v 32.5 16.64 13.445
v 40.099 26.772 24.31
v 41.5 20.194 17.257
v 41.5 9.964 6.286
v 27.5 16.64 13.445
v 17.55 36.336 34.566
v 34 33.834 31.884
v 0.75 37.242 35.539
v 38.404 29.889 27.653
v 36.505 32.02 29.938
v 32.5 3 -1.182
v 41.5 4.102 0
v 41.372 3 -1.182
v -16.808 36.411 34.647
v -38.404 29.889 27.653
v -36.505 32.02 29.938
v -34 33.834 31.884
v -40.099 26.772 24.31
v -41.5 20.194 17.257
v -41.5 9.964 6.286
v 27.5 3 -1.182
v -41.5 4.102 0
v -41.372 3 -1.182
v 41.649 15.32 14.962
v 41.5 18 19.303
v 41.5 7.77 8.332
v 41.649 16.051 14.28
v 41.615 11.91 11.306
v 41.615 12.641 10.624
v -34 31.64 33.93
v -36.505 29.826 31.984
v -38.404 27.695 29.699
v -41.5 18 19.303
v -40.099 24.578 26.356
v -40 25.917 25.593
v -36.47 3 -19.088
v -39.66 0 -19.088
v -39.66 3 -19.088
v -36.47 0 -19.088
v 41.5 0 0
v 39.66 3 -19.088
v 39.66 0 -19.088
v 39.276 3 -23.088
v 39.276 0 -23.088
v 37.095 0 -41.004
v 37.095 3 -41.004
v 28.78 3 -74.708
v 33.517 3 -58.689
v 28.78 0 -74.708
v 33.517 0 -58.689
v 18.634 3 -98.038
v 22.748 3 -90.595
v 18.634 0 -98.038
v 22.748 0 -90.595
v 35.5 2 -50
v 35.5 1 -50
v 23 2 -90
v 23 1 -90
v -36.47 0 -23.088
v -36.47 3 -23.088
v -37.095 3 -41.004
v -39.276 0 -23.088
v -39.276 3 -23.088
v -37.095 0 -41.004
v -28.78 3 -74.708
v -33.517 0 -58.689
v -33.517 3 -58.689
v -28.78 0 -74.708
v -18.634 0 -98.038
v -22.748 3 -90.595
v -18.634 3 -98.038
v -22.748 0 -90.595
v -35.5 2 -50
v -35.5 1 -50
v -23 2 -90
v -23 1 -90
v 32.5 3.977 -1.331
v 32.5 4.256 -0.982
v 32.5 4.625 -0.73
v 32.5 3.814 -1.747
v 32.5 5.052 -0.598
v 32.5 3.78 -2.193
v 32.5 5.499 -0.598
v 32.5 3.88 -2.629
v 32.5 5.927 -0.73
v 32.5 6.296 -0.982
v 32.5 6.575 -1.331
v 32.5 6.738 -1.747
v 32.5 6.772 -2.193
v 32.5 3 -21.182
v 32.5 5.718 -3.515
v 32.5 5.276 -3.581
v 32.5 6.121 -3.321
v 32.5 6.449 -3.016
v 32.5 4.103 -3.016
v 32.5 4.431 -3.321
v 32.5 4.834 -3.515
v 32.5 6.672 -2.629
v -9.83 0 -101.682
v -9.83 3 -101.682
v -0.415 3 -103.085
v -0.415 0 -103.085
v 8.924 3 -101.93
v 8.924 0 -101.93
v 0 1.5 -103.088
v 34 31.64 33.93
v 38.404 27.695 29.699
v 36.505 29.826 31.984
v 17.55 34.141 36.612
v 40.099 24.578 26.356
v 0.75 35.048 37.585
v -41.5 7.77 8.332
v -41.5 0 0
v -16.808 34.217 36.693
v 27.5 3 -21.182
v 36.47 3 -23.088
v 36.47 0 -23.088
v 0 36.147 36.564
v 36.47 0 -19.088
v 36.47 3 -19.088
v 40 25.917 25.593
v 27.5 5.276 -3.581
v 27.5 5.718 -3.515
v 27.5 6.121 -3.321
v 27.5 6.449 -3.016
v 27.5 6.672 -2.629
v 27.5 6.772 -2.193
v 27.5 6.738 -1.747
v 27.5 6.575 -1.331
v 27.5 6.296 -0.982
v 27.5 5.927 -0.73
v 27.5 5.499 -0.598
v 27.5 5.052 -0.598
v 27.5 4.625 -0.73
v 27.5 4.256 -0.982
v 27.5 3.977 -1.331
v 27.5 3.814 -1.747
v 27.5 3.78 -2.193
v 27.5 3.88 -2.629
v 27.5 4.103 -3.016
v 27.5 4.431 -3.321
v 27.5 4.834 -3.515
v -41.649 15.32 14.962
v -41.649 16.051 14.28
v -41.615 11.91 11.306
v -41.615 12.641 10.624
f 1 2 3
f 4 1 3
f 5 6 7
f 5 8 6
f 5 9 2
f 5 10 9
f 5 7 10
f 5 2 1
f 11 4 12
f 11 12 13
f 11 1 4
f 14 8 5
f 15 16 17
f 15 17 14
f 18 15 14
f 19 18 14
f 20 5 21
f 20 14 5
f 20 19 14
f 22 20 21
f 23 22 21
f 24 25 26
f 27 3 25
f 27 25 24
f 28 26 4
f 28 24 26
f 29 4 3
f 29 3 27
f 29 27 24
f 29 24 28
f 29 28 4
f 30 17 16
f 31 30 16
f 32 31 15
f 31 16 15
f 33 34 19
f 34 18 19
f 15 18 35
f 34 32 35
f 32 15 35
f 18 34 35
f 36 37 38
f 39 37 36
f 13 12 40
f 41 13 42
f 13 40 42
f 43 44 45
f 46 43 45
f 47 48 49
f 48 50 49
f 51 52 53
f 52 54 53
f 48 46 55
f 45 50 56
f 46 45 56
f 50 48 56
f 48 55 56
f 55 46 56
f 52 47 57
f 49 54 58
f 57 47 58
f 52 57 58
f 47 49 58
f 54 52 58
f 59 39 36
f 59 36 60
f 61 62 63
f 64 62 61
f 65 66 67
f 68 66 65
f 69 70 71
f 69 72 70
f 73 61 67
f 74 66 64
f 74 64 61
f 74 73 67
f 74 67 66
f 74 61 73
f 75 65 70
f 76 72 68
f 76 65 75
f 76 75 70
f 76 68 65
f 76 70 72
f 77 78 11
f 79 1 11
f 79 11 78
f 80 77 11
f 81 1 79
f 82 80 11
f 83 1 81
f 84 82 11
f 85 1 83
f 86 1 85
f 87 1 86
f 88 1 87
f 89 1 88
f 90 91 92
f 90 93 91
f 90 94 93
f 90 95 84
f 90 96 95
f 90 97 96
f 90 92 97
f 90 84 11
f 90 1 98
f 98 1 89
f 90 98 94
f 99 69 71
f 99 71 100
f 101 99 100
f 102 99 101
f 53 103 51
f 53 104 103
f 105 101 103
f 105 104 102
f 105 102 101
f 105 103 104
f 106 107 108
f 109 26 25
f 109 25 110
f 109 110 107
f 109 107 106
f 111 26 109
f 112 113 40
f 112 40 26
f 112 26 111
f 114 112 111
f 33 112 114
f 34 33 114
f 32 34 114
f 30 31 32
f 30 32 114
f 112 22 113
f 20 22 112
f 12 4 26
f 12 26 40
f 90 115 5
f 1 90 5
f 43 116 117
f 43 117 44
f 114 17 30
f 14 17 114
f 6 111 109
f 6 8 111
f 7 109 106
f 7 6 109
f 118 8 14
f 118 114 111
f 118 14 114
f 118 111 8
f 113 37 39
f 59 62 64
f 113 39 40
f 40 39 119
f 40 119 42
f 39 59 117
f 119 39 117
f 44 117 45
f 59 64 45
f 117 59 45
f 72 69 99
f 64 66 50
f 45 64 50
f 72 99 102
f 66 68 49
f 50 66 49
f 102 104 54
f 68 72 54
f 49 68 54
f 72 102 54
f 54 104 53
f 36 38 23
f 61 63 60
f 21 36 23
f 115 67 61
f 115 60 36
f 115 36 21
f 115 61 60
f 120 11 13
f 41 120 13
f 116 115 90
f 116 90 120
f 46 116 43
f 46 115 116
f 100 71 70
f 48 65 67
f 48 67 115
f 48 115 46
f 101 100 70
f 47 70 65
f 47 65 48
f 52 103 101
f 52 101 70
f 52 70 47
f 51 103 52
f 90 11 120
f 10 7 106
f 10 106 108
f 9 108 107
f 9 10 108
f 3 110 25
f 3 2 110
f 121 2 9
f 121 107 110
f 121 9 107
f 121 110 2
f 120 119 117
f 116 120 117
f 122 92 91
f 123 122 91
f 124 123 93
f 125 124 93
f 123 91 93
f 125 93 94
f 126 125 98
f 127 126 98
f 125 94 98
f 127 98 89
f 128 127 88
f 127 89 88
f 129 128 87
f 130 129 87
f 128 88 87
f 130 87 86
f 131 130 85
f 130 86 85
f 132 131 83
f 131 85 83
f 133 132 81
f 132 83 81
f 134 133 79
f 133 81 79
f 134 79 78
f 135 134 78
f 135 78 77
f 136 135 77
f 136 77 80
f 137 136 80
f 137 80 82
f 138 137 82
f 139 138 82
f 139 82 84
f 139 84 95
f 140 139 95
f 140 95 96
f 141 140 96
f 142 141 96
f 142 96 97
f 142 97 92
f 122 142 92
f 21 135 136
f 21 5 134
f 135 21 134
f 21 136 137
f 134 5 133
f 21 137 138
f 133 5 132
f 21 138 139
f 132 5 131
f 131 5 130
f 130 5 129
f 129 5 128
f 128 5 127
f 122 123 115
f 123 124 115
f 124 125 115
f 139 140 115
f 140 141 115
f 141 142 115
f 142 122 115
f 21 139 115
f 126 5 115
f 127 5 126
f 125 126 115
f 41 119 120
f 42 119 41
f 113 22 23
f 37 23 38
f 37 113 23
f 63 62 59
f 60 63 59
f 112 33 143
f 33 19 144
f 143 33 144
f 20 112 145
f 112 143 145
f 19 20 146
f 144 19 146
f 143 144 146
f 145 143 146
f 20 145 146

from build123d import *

# Parameters (mm, degrees)
BOSS_EXTRUDE3_DEPTH      = 48.5
BOSS_EXTRUDE3_DEPTH_BACK = 48.5
SKETCH5_W                = 97
SKETCH5_H                = 112
BOSS_EXTRUDE4_DEPTH      = 3
CUT_EXTRUDE2_DEPTH       = 130.256547379
CUT_EXTRUDE2_DEPTH_BACK  = 130.256547379
CUT_EXTRUDE4_DEPTH       = 3
BOSS_EXTRUDE5_DEPTH      = 2.5
BOSS_EXTRUDE5_DEPTH_BACK = 2.5
BOSS_EXTRUDE5_START      = 30
CUT_EXTRUDE5_REACH       = 139.837
SKETCH7_R                = 1.5
CUT_EXTRUDE6_DEPTH       = 122.615440307
CUT_EXTRUDE6_DEPTH_BACK  = 122.615440307
CUT_EXTRUDE7_DEPTH       = 122.12407756
CUT_EXTRUDE7_DEPTH_BACK  = 122.12407756
CUT_EXTRUDE8_DEPTH       = 117.339027133
CUT_EXTRUDE8_DEPTH_BACK  = 117.339027133
SKETCH10_W               = 6
SKETCH10_H               = 4


with BuildPart() as part:
    # Sketch2 → Boss-Extrude3 (new, two sides: drawn at the far end of the back side and taken through both)
    with BuildSketch(Plane(origin=(0, 0, 0), x_dir=(0, 0, -1), z_dir=(1, 0, 0)).offset(-BOSS_EXTRUDE3_DEPTH_BACK)):
        Polygon((0, 3), (0, 0), (-43.282778347, 40.361843779), (-41.236783267, 42.555904884), (1.181731427, 3), align=None)
    extrude(amount=BOSS_EXTRUDE3_DEPTH + BOSS_EXTRUDE3_DEPTH_BACK)

    # Sketch5 → Boss-Extrude4 (add)
    with BuildSketch(Plane(origin=(0, 0, 0), x_dir=(1, 0, 0), z_dir=(0, 1, 0))):
        with Locations((0, 56)):
            Rectangle(SKETCH5_W, SKETCH5_H)
    extrude(amount=BOSS_EXTRUDE4_DEPTH)

    # Sketch1 → Cut-Extrude2 (cut, two sides: drawn at the far end of the back side and taken through both)
    with BuildSketch(Plane(origin=(0, 0, 0), x_dir=(1, 0, 0), z_dir=(0, 1, 0)).offset(-CUT_EXTRUDE2_DEPTH_BACK)):
        with BuildLine():
            Line((-48.5, 112), (-48.5, 0))
            add(Edge.make_bspline(
                [(-48.5, 0), (-46.668219381, 16.73988075), (-45.240302981, 47.028669482), (-35.05303198, 77.976446005), (-30, 90)],
                knots=[0, 0, 0, 0, 0.382344481, 0.700509355, 0.700509355, 0.700509355, 0.700509355], degree=3))
            add(Edge.make_bspline(
                [(-30, 90), (0, 116.175267558), (30, 90)],
                knots=[0, 0, 0, 1, 1, 1], degree=2))
            add(Edge.make_bspline(
                [(48.5, 0), (46.668219381, 16.73988075), (45.240302981, 47.028669482), (35.05303198, 77.976446005), (30, 90)],
                knots=[0, 0, 0, 0, 0.382344481, 0.700509355, 0.700509355, 0.700509355, 0.700509355], degree=3))
            Line((48.5, 0), (48.5, 112))
            Line((48.5, 112), (0.000604535, 112))
            add(Edge.make_bspline(
                [(0.000604535, 112), (0.000402118, 112.000000335), (0.000200606, 112), (0, 112)],
                knots=[0.499749242, 0.499749242, 0.499749242, 0.499749242, 0.5, 0.5, 0.5, 0.5], degree=3))
            add(Edge.make_bspline(
                [(-0.000604535, 112), (-0.000402118, 112.000000335), (-0.000200606, 112), (0, 112)],
                knots=[0.499749242, 0.499749242, 0.499749242, 0.499749242, 0.5, 0.5, 0.5, 0.5], degree=3))
            Line((-0.000604535, 112), (-48.5, 112))
        make_face()
    extrude(amount=CUT_EXTRUDE2_DEPTH + CUT_EXTRUDE2_DEPTH_BACK, mode=Mode.SUBTRACT)

    # Sketch3 → Cut-Extrude4 (cut)
    with BuildSketch(Plane(origin=(0, 2.194061105, -2.04599508), x_dir=(1, 0, 0), z_dir=(0, 0.7313537016191954, -0.6819983600624717))):
        with BuildLine():
            add(Edge.make_bspline(
                [(0.003253746, -59.181731489), (0.002169164, -59.181731447), (0.001084582, -59.181731427), (-11.666666667, -59.181731427), (-23.333333333, -58.181731427), (-35, -56.181731427)],
                knots=[0.5, 0.5, 0.5, 0.5, 0.500017125, 0.500017125, 0.68423249, 0.68423249, 0.68423249, 0.68423249], degree=3))
            add(Edge.make_bspline(
                [(-48.5, -21.181731427), (-48.417358315, -22.852595783), (-47.967318833, -26.18014585), (-47.488346612, -31.180984412), (-47.077284528, -36.21090256), (-46.163364333, -41.331987069), (-44.016260247, -46.352305403), (-40.960990685, -51.961105588), (-37.244446824, -54.910271793), (-35, -56.181731427)],
                knots=[0.083959733, 0.083959733, 0.083959733, 0.083959733, 0.112085896, 0.140212058, 0.168338221, 0.196879042, 0.227021509, 0.259659186, 0.303375618, 0.303375618, 0.303375618, 0.303375618], degree=3))
            Line((-48.5, -21.181731427), (-48.5, -61.181731427))
            Line((-48.5, -61.181731427), (48.5, -61.181731427))
            Line((48.5, -61.181731427), (48.5, -21.181731427))
            add(Edge.make_bspline(
                [(35, -56.181731427), (37.244446825, -54.910271793), (40.960990685, -51.961105588), (44.016260247, -46.352305403), (46.163364333, -41.331987069), (47.077284528, -36.21090256), (47.488346612, -31.180984412), (47.967318833, -26.18014585), (48.417358315, -22.852595783), (48.5, -21.181731427)],
                knots=[0.696624382, 0.696624382, 0.696624382, 0.696624382, 0.740340814, 0.772978491, 0.803120958, 0.831661779, 0.859787942, 0.887914104, 0.916040267, 0.916040267, 0.916040267, 0.916040267], degree=3))
            add(Edge.make_bspline(
                [(0.003253746, -59.181731401), (17.501626873, -59.181452534), (35, -56.181731427)],
                knots=[0.500046482, 0.500046482, 0.500046482, 1, 1, 1], degree=2))
        make_face()
    extrude(amount=-CUT_EXTRUDE4_DEPTH, mode=Mode.SUBTRACT)

    # Sketch6 → Boss-Extrude5 (add, two sides: drawn at the far end of the back side and taken through both)
    with BuildSketch(Plane(origin=(0, 0, 0), x_dir=(0, 0, -1), z_dir=(1, 0, 0)).offset(BOSS_EXTRUDE5_START - BOSS_EXTRUDE5_DEPTH_BACK)):
        Polygon((-13.445342606, 16.639967201), (1.181731427, 3), (21.181731427, 3), align=None)
    extrude(amount=BOSS_EXTRUDE5_DEPTH + BOSS_EXTRUDE5_DEPTH_BACK)

    # Sketch7 → Cut-Extrude5 (cut, up to next)
    with BuildSketch(Plane(origin=(32.5, 0, 0), x_dir=(0, 0, -1), z_dir=(1, 0, 0)), mode=Mode.PRIVATE) as cut_extrude5_sk1:
        with Locations((2.081159003, 5.275894374)):
            Circle(SKETCH7_R)
    cut_extrude5_tool1 = extrude(cut_extrude5_sk1.sketch, amount=-CUT_EXTRUDE5_REACH, mode=Mode.PRIVATE) & part.part
    add(cut_extrude5_tool1.solids().sort_by_distance((32.5, 5.275894, -2.081159))[0], mode=Mode.SUBTRACT)

    # Sketch8 → Cut-Extrude6 (cut, two sides: drawn at the far end of the back side and taken through both)
    with BuildSketch(Plane(origin=(0, 0, 0), x_dir=(1, 0, 0), z_dir=(0, 1, 0)).offset(-CUT_EXTRUDE6_DEPTH_BACK)):
        with BuildLine():
            Line((-54.764420155, 0), (-41.5, 0))
            add(Edge.make_bspline(
                [(-41.5, 0), (-39.668219381, 16.73988075), (-38.240302981, 47.028669482), (-26.765457272, 81.887952266), (-20.154727783, 96.534338226), (-17, 100)],
                knots=[0, 0, 0, 0, 0.382344481, 0.700509355, 0.789047112, 0.789047112, 0.789047112, 0.789047112], degree=3))
            add(Edge.make_bspline(
                [(-17, 100), (0, 120), (17, 100)],
                knots=[0, 0, 0, 1, 1, 1], degree=2))
            add(Edge.make_bspline(
                [(41.5, 0), (39.668219381, 16.73988075), (38.240302981, 47.028669482), (26.765457272, 81.887952266), (20.154727783, 96.534338226), (17, 100)],
                knots=[0, 0, 0, 0, 0.382344481, 0.700509355, 0.789047112, 0.789047112, 0.789047112, 0.789047112], degree=3))
            Line((41.5, 0), (52.945964887, 0))
            Line((52.945964887, 0), (52.945964887, 112))
            Line((52.945964887, 112), (0.000604535, 112))
            add(Edge.make_bspline(
                [(0.000604535, 112), (0.000402118, 112.000000335), (0.000200606, 112), (-0.000200606, 112), (-0.000402118, 112.000000335), (-0.000604535, 112)],
                knots=[0.499749242, 0.499749242, 0.499749242, 0.499749242, 0.5, 0.5, 0.500250758, 0.500250758, 0.500250758, 0.500250758], degree=3))
            Line((-0.000604535, 112), (-54.764420155, 112))
            Line((-54.764420155, 112), (-54.764420155, 0))
        make_face()
    extrude(amount=CUT_EXTRUDE6_DEPTH + CUT_EXTRUDE6_DEPTH_BACK, mode=Mode.SUBTRACT)

    # Sketch9 → Cut-Extrude7 (cut, two sides: drawn at the far end of the back side and taken through both)
    with BuildSketch(Plane(origin=(0, -0.88962398, -0.95400492), x_dir=(1, 0, 0), z_dir=(0, -0.7313537016191742, 0.6819983600624945)).offset(-CUT_EXTRUDE7_DEPTH_BACK)):
        with BuildLine():
            Line((-48.5, 1.304437125), (-41.5, 1.304437125))
            Line((-41.5, 1.304437125), (-41.5, 12.697506333))
            add(Edge.make_bspline(
                [(-41.5, 12.697506333), (-41.619417946, 17.695292117), (-41.882631341, 26.061036421), (-40.482582838, 38.387050164), (-37.089687463, 45.094795293), (-34, 47.697506333)],
                knots=[0.453483069, 0.453483069, 0.453483069, 0.453483069, 0.764085595, 0.973470506, 1.217568664, 1.217568664, 1.217568664, 1.217568664], degree=3))
            add(Edge.make_bspline(
                [(-34, 47.697506333), (0, 57.697506333), (34, 47.697506333)],
                knots=[0, 0, 0, 1, 1, 1], degree=2))
            add(Edge.make_bspline(
                [(34, 47.697506333), (37.089687463, 45.094795293), (40.482582838, 38.387050164), (41.882631341, 26.061036421), (41.619417946, 17.695292117), (41.5, 12.697506333)],
                knots=[0, 0, 0, 0, 0.244098157, 0.453483069, 0.764085595, 0.764085595, 0.764085595, 0.764085595], degree=3))
            Line((41.5, 12.697506333), (41.5, 1.304437125))
            Line((41.5, 1.304437125), (48.5, 1.304437125))
            Line((48.5, 1.304437125), (52.410754568, 1.304437125))
            Line((52.410754568, 1.304437125), (52.410754568, 62.418268573))
            Line((52.410754568, 62.418268573), (-55.183679752, 62.418268573))
            Line((-55.183679752, 62.418268573), (-55.183679752, 1.304437125))
            Line((-55.183679752, 1.304437125), (-48.5, 1.304437125))
        make_face()
    extrude(amount=CUT_EXTRUDE7_DEPTH + CUT_EXTRUDE7_DEPTH_BACK, mode=Mode.SUBTRACT)

    # Sketch10 → Cut-Extrude8 (cut, two sides: drawn at the far end of the back side and taken through both)
    with BuildSketch(Plane(origin=(0, 3, 0), x_dir=(1, 0, 0), z_dir=(0, 1, 0)).offset(-CUT_EXTRUDE8_DEPTH_BACK)):
        with Locations((-39.47035467, 21.087633779)):
            Rectangle(SKETCH10_W, SKETCH10_H)
        with Locations((39.47035467, 21.087633779)):
            Rectangle(SKETCH10_W, SKETCH10_H)
    extrude(amount=CUT_EXTRUDE8_DEPTH + CUT_EXTRUDE8_DEPTH_BACK, mode=Mode.SUBTRACT)


solid = part.part
